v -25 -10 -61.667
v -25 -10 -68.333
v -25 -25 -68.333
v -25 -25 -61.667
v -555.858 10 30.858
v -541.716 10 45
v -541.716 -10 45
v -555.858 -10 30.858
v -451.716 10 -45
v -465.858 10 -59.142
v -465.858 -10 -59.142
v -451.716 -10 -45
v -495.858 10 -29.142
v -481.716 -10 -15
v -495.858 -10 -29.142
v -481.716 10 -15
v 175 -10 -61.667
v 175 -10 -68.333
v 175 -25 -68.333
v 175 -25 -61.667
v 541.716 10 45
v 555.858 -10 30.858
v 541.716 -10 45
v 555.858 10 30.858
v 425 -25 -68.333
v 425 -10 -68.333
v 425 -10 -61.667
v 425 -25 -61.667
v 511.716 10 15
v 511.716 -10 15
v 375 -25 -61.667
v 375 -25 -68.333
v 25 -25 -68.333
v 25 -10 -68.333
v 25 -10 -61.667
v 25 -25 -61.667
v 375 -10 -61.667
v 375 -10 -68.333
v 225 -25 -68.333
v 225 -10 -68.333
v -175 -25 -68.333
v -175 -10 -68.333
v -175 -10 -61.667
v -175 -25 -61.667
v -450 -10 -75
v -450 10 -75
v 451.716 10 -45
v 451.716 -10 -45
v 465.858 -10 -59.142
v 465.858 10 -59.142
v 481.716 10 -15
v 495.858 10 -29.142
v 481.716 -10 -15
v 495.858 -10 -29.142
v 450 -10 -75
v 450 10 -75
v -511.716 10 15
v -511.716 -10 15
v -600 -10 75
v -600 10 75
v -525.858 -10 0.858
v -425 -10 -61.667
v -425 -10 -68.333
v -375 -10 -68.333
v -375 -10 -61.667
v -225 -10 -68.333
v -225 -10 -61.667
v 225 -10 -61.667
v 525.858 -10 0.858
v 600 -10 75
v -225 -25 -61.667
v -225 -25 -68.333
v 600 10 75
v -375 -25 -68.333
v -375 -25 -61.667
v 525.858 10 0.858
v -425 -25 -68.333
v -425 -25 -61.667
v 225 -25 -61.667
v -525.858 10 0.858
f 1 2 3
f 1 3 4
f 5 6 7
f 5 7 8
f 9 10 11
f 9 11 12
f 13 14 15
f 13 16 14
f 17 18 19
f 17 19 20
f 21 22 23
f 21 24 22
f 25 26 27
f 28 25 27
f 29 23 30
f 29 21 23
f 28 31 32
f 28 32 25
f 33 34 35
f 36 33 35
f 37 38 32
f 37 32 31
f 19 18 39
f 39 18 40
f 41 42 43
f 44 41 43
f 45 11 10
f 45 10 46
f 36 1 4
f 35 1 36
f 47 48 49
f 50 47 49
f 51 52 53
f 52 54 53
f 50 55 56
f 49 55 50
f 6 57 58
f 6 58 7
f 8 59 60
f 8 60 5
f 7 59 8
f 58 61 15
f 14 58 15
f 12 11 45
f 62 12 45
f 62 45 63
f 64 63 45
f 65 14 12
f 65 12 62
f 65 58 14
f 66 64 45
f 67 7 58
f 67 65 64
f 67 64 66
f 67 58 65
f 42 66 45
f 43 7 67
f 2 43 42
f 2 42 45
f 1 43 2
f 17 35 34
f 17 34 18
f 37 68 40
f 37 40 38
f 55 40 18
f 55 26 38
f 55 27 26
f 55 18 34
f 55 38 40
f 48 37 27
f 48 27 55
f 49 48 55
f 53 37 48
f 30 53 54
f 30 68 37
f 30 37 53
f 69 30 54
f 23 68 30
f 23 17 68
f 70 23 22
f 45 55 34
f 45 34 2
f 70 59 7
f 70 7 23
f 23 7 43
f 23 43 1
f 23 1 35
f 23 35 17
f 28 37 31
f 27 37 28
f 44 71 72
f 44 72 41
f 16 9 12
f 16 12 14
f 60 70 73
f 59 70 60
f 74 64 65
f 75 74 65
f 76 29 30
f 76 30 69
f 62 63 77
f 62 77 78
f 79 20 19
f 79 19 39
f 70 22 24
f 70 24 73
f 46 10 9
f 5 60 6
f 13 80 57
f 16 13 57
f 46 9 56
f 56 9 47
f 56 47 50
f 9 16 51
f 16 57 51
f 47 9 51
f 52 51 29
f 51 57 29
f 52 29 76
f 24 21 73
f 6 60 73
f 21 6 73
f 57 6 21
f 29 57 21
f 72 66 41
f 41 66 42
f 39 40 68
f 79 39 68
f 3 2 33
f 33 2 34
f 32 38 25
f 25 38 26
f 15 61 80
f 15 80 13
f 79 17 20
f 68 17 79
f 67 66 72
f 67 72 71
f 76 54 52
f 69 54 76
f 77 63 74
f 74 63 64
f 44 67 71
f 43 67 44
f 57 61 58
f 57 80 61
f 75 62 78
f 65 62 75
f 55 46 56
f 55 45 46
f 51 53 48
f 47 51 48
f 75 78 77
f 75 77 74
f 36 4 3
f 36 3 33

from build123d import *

# Parameters (mm, degrees)
F2_DEPTH = 10
F4_DEPTH = 10
F5_W     = 50
F5_H     = 6.6666666667
F6_DEPTH = 15


with BuildPart() as f2:
    # F1 (on Front) → F2 (new body, symmetric)
    with BuildSketch(Plane.XZ):
        Polygon((450, -75), (600, 75), (-600, 75), (-450, -75), align=None)
    extrude(amount=F2_DEPTH, both=True)

    # F3 (on Front) → F4 (cut, symmetric)
    with BuildSketch(Plane.XZ):
        Polygon((-541.7157287525, 45), (-555.8578643763, 30.8578643763), (-525.8578643763, 0.8578643763), (-511.7157287525, 15), align=None)
        Polygon((-451.7157287525, -45), (-481.7157287525, -15), (-495.8578643763, -29.1421356237), (-465.8578643763, -59.1421356237), align=None)
        Polygon((525.8578643763, 0.8578643763), (555.8578643763, 30.8578643763), (541.7157287525, 45), (511.7157287525, 15), align=None)
        Polygon((495.8578643763, -29.1421356237), (481.7157287525, -15), (451.7157287525, -45), (465.8578643763, -59.1421356237), align=None)
    extrude(amount=F4_DEPTH, both=True, mode=Mode.SUBTRACT)

    # F5 (on face) → F6 (join)
    with BuildSketch(Plane.XZ.offset(10)):
        with Locations((0, -65)):
            Rectangle(F5_W, F5_H)
        with Locations((200, -65)):
            Rectangle(F5_W, F5_H)
        with Locations((400, -65)):
            Rectangle(F5_W, F5_H)
        with Locations((-200, -65)):
            Rectangle(F5_W, F5_H)
        with Locations((-400, -65)):
            Rectangle(F5_W, F5_H)
    extrude(amount=F6_DEPTH)


solid = f2.part
